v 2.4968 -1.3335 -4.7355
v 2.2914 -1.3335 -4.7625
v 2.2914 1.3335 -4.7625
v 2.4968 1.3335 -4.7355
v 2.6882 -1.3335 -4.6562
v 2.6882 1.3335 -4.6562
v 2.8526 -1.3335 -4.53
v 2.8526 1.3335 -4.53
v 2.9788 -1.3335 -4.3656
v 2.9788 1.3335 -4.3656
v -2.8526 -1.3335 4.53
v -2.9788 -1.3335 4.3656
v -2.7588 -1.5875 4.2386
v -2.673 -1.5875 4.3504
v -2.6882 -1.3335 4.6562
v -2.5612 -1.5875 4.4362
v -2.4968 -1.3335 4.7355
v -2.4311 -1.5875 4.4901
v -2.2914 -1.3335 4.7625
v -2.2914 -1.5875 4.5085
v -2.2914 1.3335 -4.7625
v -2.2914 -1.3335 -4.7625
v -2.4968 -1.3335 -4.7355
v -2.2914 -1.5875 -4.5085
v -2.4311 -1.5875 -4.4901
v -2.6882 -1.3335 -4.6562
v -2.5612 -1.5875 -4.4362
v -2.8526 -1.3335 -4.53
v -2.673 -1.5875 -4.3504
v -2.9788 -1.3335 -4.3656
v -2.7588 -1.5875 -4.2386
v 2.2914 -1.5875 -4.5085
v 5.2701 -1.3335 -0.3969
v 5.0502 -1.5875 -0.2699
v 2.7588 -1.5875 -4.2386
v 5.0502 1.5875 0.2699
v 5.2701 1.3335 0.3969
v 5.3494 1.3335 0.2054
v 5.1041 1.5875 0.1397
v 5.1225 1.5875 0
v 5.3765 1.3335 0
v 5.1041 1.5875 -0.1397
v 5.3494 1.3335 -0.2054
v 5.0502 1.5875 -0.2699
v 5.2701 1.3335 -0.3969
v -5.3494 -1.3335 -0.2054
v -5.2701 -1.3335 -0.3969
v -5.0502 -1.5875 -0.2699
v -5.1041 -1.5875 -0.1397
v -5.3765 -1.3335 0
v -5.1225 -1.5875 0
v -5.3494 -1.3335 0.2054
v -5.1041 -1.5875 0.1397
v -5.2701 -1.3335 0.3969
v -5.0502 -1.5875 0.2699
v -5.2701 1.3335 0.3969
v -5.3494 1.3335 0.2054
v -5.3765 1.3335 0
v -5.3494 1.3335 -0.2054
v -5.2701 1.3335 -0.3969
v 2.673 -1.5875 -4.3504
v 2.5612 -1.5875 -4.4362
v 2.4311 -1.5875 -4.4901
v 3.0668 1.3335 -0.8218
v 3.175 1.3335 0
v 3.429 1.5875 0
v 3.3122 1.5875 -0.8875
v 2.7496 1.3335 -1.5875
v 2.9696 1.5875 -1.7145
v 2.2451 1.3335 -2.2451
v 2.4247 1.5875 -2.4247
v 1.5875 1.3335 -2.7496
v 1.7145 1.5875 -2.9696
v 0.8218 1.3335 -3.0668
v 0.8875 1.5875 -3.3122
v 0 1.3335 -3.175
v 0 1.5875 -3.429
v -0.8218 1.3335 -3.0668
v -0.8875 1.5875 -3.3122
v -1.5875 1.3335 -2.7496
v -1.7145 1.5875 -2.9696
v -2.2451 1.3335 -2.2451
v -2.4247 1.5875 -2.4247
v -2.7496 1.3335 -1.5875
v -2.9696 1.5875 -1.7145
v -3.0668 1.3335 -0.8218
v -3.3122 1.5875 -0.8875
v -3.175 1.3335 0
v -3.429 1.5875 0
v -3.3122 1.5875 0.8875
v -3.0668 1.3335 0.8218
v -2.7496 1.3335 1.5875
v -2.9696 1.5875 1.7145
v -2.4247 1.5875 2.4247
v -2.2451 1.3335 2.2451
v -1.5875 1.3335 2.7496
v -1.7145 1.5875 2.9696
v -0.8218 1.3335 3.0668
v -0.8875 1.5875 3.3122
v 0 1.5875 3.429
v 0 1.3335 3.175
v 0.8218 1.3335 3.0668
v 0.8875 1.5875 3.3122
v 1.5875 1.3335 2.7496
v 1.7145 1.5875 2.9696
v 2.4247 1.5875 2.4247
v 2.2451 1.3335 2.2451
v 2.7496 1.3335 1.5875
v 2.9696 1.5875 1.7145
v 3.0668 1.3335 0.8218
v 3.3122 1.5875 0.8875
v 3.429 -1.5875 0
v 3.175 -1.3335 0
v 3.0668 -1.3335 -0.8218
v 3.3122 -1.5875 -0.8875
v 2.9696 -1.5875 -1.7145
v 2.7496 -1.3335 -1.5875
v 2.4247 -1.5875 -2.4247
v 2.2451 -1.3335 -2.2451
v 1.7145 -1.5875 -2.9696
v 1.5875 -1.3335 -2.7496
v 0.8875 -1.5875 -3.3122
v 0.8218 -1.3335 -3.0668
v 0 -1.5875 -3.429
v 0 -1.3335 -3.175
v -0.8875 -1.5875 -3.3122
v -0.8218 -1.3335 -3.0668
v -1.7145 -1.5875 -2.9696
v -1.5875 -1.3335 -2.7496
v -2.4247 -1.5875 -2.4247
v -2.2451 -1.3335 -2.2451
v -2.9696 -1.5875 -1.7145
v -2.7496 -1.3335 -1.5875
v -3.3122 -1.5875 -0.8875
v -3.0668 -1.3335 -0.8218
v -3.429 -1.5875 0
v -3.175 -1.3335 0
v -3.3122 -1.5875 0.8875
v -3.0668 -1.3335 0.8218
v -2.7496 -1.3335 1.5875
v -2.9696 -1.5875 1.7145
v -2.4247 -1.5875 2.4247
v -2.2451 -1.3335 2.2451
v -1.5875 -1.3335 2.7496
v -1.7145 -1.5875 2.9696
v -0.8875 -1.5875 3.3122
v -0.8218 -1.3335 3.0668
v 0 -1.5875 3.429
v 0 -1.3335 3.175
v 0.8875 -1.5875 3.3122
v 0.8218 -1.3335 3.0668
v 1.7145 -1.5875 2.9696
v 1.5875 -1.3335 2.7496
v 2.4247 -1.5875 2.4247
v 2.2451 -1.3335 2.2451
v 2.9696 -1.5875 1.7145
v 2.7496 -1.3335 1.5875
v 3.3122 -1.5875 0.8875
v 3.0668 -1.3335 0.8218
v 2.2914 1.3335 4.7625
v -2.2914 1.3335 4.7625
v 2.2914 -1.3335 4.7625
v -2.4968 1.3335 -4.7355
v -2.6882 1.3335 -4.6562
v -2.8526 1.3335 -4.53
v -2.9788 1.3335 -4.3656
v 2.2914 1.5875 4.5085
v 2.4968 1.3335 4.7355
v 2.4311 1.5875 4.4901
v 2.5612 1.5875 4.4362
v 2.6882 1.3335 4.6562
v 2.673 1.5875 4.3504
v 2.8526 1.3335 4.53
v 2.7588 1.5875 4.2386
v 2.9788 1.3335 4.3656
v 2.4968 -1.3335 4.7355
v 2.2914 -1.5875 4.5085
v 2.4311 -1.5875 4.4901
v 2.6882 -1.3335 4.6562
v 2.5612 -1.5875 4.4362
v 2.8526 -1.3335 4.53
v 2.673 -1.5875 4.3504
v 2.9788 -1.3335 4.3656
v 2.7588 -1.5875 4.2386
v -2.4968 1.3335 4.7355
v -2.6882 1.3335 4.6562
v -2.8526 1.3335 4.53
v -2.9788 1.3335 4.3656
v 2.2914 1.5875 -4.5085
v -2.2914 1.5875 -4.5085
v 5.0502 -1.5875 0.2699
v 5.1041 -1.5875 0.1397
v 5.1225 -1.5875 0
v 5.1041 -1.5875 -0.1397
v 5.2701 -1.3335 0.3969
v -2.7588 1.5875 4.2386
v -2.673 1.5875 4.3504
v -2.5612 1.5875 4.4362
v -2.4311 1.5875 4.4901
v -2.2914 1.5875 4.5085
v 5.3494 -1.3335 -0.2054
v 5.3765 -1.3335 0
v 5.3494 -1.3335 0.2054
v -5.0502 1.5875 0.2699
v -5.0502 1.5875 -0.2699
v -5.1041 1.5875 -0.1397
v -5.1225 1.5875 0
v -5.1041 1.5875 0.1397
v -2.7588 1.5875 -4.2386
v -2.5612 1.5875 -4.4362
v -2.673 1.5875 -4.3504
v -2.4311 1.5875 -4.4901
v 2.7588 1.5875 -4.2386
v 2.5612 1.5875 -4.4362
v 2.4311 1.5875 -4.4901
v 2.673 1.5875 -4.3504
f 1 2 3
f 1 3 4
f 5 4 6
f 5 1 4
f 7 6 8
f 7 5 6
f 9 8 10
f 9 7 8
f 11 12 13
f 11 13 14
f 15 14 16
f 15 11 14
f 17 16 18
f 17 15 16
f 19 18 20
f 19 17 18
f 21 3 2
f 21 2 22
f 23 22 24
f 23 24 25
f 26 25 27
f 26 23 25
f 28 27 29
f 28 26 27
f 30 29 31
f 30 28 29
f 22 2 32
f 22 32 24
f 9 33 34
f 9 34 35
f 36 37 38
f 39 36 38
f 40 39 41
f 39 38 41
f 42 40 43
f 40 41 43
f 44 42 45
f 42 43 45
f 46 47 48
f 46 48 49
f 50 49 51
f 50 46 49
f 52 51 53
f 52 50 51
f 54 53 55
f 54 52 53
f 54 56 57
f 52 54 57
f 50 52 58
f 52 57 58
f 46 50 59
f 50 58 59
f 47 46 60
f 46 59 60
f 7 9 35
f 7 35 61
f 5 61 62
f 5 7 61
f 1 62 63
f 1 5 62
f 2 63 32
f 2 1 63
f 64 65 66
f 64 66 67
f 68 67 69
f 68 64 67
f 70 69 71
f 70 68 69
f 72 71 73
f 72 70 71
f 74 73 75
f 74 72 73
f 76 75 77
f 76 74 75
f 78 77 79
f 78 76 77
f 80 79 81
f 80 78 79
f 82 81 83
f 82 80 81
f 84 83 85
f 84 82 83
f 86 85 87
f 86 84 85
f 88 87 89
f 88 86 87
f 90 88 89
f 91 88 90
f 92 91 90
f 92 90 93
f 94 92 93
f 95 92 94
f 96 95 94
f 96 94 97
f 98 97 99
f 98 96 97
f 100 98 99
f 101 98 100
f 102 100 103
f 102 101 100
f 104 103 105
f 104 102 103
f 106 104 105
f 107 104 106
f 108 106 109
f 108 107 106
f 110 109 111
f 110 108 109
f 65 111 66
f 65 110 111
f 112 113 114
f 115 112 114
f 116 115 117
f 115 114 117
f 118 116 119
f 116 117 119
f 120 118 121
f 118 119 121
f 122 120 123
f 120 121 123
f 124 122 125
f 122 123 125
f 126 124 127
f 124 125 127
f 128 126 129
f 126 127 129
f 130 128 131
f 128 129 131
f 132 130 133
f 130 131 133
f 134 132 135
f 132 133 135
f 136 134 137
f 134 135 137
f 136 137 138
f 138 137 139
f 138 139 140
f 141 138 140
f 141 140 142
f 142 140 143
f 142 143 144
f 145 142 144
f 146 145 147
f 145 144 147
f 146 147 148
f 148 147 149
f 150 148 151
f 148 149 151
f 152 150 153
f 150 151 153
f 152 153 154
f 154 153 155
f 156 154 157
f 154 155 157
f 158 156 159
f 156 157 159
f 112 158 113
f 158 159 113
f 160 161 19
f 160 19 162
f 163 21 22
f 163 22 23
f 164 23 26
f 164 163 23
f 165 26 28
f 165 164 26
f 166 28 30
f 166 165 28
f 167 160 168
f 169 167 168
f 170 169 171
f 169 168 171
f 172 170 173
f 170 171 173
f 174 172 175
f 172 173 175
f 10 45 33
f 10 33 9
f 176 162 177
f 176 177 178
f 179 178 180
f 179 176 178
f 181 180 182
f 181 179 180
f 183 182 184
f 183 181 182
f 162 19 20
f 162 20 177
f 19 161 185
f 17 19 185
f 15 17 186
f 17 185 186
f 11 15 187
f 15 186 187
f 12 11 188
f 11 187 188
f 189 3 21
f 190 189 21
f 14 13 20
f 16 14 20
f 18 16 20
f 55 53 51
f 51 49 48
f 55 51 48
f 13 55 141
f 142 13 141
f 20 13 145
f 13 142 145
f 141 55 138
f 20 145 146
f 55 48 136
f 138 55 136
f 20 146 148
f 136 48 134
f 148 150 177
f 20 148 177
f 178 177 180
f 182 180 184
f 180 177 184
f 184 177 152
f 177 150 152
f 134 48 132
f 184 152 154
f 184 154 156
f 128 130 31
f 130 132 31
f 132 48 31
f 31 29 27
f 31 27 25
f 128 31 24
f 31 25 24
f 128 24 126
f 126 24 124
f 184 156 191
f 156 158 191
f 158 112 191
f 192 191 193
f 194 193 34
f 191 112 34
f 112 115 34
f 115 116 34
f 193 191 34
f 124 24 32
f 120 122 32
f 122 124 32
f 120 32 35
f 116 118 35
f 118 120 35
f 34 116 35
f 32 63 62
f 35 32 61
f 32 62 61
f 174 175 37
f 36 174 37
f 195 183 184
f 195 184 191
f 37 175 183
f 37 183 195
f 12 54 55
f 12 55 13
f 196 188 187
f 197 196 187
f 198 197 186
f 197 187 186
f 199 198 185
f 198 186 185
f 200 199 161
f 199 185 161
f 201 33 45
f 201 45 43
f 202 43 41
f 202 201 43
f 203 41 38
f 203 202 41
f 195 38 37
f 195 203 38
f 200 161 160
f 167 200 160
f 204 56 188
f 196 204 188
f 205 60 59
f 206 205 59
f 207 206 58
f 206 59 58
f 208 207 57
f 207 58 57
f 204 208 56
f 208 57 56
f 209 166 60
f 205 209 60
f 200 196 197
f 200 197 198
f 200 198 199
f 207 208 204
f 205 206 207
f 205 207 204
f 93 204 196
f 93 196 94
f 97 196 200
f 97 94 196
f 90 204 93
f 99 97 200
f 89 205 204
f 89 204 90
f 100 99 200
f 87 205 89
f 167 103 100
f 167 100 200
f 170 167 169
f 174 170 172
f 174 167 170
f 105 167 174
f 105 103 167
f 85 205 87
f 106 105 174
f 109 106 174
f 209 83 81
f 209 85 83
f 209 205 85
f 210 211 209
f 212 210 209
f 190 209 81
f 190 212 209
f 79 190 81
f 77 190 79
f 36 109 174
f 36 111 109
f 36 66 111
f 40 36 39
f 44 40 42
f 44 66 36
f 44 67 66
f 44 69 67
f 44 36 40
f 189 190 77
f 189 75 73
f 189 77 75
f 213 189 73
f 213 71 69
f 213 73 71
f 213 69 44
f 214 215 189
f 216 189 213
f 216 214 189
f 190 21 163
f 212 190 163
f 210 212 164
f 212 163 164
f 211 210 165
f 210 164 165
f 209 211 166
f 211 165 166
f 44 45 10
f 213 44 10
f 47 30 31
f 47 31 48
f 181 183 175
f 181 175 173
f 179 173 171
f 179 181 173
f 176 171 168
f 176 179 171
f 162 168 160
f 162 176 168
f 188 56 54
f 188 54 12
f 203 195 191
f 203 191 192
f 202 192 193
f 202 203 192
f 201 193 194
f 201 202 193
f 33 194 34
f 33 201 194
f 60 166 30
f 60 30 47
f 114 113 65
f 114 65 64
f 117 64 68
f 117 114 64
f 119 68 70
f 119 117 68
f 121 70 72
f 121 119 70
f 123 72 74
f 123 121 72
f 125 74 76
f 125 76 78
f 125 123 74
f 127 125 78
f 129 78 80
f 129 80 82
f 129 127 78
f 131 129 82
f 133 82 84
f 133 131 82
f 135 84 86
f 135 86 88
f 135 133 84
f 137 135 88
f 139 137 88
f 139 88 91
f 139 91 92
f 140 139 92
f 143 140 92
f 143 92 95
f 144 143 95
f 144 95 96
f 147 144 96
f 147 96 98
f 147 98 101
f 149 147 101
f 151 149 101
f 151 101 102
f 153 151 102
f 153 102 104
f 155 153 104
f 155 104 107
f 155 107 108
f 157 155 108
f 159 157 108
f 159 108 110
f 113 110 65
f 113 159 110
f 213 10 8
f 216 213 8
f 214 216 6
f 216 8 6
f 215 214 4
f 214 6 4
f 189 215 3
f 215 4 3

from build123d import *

# Parameters (mm, degrees)
SKETCH1_R           = 3.175
BOSS_EXTRUDE1_DEPTH = 1.5875
FILLET1_R           = 0.79375
CHAMFER1_SIZE       = 0.254


with BuildPart() as part:
    # Sketch1 → Boss-Extrude1 (new body, symmetric)
    with BuildSketch(Plane(origin=(0, 0, 0), x_dir=(1, 0, 0), z_dir=(0, 1, 0))):
        Polygon((2.749630657, 4.7625), (-2.749630657, 4.7625), (-5.499261314, 0), (-2.749630657, -4.7625), (2.749630657, -4.7625), (5.499261314, 0), align=None)
        Circle(SKETCH1_R, mode=Mode.SUBTRACT)
    extrude(amount=BOSS_EXTRUDE1_DEPTH, both=True)

    # Fillet1
    fillet1_edges = [part.edges().sort_by_distance(p)[0] for p in [
        (5.499261314, 0, 0),
        (2.749630657, 0, 4.7625),
        (-2.749630657, 0, 4.7625),
        (-5.499261314, 0, 0),
        (-2.749630657, 0, -4.7625),
        (2.749630657, 0, -4.7625),
    ]]
    fillet(fillet1_edges, radius=FILLET1_R)

    # Chamfer1
    chamfer1_edges = [part.edges().sort_by_distance(p)[0] for p in [
        (-3.175, -1.5875, 0),
        (-3.175, 1.5875, 0),
        (-4.124445986, -1.5875, 2.38125),
        (-4.124445986, 1.5875, 2.38125),
        (4.124445986, -1.5875, -2.38125),
        (4.124445986, -1.5875, 2.38125),
        (0, -1.5875, 4.7625),
        (-4.124445986, -1.5875, -2.38125),
        (0, -1.5875, -4.7625),
        (2.688233881, -1.5875, 4.656157664),
        (-2.688233881, -1.5875, 4.656157664),
        (5.376467762, -1.5875, 0),
        (2.688233881, -1.5875, -4.656157664),
        (-2.688233881, -1.5875, -4.656157664),
        (-5.376467762, -1.5875, 0),
        (-4.124445986, 1.5875, -2.38125),
        (4.124445986, 1.5875, -2.38125),
        (0, 1.5875, -4.7625),
        (0, 1.5875, 4.7625),
        (4.124445986, 1.5875, 2.38125),
        (2.688233881, 1.5875, 4.656157664),
        (-2.688233881, 1.5875, 4.656157664),
        (5.376467762, 1.5875, 0),
        (2.688233881, 1.5875, -4.656157664),
        (-2.688233881, 1.5875, -4.656157664),
        (-5.376467762, 1.5875, 0),
    ]]
    chamfer(chamfer1_edges, length=CHAMFER1_SIZE)


solid = part.part
